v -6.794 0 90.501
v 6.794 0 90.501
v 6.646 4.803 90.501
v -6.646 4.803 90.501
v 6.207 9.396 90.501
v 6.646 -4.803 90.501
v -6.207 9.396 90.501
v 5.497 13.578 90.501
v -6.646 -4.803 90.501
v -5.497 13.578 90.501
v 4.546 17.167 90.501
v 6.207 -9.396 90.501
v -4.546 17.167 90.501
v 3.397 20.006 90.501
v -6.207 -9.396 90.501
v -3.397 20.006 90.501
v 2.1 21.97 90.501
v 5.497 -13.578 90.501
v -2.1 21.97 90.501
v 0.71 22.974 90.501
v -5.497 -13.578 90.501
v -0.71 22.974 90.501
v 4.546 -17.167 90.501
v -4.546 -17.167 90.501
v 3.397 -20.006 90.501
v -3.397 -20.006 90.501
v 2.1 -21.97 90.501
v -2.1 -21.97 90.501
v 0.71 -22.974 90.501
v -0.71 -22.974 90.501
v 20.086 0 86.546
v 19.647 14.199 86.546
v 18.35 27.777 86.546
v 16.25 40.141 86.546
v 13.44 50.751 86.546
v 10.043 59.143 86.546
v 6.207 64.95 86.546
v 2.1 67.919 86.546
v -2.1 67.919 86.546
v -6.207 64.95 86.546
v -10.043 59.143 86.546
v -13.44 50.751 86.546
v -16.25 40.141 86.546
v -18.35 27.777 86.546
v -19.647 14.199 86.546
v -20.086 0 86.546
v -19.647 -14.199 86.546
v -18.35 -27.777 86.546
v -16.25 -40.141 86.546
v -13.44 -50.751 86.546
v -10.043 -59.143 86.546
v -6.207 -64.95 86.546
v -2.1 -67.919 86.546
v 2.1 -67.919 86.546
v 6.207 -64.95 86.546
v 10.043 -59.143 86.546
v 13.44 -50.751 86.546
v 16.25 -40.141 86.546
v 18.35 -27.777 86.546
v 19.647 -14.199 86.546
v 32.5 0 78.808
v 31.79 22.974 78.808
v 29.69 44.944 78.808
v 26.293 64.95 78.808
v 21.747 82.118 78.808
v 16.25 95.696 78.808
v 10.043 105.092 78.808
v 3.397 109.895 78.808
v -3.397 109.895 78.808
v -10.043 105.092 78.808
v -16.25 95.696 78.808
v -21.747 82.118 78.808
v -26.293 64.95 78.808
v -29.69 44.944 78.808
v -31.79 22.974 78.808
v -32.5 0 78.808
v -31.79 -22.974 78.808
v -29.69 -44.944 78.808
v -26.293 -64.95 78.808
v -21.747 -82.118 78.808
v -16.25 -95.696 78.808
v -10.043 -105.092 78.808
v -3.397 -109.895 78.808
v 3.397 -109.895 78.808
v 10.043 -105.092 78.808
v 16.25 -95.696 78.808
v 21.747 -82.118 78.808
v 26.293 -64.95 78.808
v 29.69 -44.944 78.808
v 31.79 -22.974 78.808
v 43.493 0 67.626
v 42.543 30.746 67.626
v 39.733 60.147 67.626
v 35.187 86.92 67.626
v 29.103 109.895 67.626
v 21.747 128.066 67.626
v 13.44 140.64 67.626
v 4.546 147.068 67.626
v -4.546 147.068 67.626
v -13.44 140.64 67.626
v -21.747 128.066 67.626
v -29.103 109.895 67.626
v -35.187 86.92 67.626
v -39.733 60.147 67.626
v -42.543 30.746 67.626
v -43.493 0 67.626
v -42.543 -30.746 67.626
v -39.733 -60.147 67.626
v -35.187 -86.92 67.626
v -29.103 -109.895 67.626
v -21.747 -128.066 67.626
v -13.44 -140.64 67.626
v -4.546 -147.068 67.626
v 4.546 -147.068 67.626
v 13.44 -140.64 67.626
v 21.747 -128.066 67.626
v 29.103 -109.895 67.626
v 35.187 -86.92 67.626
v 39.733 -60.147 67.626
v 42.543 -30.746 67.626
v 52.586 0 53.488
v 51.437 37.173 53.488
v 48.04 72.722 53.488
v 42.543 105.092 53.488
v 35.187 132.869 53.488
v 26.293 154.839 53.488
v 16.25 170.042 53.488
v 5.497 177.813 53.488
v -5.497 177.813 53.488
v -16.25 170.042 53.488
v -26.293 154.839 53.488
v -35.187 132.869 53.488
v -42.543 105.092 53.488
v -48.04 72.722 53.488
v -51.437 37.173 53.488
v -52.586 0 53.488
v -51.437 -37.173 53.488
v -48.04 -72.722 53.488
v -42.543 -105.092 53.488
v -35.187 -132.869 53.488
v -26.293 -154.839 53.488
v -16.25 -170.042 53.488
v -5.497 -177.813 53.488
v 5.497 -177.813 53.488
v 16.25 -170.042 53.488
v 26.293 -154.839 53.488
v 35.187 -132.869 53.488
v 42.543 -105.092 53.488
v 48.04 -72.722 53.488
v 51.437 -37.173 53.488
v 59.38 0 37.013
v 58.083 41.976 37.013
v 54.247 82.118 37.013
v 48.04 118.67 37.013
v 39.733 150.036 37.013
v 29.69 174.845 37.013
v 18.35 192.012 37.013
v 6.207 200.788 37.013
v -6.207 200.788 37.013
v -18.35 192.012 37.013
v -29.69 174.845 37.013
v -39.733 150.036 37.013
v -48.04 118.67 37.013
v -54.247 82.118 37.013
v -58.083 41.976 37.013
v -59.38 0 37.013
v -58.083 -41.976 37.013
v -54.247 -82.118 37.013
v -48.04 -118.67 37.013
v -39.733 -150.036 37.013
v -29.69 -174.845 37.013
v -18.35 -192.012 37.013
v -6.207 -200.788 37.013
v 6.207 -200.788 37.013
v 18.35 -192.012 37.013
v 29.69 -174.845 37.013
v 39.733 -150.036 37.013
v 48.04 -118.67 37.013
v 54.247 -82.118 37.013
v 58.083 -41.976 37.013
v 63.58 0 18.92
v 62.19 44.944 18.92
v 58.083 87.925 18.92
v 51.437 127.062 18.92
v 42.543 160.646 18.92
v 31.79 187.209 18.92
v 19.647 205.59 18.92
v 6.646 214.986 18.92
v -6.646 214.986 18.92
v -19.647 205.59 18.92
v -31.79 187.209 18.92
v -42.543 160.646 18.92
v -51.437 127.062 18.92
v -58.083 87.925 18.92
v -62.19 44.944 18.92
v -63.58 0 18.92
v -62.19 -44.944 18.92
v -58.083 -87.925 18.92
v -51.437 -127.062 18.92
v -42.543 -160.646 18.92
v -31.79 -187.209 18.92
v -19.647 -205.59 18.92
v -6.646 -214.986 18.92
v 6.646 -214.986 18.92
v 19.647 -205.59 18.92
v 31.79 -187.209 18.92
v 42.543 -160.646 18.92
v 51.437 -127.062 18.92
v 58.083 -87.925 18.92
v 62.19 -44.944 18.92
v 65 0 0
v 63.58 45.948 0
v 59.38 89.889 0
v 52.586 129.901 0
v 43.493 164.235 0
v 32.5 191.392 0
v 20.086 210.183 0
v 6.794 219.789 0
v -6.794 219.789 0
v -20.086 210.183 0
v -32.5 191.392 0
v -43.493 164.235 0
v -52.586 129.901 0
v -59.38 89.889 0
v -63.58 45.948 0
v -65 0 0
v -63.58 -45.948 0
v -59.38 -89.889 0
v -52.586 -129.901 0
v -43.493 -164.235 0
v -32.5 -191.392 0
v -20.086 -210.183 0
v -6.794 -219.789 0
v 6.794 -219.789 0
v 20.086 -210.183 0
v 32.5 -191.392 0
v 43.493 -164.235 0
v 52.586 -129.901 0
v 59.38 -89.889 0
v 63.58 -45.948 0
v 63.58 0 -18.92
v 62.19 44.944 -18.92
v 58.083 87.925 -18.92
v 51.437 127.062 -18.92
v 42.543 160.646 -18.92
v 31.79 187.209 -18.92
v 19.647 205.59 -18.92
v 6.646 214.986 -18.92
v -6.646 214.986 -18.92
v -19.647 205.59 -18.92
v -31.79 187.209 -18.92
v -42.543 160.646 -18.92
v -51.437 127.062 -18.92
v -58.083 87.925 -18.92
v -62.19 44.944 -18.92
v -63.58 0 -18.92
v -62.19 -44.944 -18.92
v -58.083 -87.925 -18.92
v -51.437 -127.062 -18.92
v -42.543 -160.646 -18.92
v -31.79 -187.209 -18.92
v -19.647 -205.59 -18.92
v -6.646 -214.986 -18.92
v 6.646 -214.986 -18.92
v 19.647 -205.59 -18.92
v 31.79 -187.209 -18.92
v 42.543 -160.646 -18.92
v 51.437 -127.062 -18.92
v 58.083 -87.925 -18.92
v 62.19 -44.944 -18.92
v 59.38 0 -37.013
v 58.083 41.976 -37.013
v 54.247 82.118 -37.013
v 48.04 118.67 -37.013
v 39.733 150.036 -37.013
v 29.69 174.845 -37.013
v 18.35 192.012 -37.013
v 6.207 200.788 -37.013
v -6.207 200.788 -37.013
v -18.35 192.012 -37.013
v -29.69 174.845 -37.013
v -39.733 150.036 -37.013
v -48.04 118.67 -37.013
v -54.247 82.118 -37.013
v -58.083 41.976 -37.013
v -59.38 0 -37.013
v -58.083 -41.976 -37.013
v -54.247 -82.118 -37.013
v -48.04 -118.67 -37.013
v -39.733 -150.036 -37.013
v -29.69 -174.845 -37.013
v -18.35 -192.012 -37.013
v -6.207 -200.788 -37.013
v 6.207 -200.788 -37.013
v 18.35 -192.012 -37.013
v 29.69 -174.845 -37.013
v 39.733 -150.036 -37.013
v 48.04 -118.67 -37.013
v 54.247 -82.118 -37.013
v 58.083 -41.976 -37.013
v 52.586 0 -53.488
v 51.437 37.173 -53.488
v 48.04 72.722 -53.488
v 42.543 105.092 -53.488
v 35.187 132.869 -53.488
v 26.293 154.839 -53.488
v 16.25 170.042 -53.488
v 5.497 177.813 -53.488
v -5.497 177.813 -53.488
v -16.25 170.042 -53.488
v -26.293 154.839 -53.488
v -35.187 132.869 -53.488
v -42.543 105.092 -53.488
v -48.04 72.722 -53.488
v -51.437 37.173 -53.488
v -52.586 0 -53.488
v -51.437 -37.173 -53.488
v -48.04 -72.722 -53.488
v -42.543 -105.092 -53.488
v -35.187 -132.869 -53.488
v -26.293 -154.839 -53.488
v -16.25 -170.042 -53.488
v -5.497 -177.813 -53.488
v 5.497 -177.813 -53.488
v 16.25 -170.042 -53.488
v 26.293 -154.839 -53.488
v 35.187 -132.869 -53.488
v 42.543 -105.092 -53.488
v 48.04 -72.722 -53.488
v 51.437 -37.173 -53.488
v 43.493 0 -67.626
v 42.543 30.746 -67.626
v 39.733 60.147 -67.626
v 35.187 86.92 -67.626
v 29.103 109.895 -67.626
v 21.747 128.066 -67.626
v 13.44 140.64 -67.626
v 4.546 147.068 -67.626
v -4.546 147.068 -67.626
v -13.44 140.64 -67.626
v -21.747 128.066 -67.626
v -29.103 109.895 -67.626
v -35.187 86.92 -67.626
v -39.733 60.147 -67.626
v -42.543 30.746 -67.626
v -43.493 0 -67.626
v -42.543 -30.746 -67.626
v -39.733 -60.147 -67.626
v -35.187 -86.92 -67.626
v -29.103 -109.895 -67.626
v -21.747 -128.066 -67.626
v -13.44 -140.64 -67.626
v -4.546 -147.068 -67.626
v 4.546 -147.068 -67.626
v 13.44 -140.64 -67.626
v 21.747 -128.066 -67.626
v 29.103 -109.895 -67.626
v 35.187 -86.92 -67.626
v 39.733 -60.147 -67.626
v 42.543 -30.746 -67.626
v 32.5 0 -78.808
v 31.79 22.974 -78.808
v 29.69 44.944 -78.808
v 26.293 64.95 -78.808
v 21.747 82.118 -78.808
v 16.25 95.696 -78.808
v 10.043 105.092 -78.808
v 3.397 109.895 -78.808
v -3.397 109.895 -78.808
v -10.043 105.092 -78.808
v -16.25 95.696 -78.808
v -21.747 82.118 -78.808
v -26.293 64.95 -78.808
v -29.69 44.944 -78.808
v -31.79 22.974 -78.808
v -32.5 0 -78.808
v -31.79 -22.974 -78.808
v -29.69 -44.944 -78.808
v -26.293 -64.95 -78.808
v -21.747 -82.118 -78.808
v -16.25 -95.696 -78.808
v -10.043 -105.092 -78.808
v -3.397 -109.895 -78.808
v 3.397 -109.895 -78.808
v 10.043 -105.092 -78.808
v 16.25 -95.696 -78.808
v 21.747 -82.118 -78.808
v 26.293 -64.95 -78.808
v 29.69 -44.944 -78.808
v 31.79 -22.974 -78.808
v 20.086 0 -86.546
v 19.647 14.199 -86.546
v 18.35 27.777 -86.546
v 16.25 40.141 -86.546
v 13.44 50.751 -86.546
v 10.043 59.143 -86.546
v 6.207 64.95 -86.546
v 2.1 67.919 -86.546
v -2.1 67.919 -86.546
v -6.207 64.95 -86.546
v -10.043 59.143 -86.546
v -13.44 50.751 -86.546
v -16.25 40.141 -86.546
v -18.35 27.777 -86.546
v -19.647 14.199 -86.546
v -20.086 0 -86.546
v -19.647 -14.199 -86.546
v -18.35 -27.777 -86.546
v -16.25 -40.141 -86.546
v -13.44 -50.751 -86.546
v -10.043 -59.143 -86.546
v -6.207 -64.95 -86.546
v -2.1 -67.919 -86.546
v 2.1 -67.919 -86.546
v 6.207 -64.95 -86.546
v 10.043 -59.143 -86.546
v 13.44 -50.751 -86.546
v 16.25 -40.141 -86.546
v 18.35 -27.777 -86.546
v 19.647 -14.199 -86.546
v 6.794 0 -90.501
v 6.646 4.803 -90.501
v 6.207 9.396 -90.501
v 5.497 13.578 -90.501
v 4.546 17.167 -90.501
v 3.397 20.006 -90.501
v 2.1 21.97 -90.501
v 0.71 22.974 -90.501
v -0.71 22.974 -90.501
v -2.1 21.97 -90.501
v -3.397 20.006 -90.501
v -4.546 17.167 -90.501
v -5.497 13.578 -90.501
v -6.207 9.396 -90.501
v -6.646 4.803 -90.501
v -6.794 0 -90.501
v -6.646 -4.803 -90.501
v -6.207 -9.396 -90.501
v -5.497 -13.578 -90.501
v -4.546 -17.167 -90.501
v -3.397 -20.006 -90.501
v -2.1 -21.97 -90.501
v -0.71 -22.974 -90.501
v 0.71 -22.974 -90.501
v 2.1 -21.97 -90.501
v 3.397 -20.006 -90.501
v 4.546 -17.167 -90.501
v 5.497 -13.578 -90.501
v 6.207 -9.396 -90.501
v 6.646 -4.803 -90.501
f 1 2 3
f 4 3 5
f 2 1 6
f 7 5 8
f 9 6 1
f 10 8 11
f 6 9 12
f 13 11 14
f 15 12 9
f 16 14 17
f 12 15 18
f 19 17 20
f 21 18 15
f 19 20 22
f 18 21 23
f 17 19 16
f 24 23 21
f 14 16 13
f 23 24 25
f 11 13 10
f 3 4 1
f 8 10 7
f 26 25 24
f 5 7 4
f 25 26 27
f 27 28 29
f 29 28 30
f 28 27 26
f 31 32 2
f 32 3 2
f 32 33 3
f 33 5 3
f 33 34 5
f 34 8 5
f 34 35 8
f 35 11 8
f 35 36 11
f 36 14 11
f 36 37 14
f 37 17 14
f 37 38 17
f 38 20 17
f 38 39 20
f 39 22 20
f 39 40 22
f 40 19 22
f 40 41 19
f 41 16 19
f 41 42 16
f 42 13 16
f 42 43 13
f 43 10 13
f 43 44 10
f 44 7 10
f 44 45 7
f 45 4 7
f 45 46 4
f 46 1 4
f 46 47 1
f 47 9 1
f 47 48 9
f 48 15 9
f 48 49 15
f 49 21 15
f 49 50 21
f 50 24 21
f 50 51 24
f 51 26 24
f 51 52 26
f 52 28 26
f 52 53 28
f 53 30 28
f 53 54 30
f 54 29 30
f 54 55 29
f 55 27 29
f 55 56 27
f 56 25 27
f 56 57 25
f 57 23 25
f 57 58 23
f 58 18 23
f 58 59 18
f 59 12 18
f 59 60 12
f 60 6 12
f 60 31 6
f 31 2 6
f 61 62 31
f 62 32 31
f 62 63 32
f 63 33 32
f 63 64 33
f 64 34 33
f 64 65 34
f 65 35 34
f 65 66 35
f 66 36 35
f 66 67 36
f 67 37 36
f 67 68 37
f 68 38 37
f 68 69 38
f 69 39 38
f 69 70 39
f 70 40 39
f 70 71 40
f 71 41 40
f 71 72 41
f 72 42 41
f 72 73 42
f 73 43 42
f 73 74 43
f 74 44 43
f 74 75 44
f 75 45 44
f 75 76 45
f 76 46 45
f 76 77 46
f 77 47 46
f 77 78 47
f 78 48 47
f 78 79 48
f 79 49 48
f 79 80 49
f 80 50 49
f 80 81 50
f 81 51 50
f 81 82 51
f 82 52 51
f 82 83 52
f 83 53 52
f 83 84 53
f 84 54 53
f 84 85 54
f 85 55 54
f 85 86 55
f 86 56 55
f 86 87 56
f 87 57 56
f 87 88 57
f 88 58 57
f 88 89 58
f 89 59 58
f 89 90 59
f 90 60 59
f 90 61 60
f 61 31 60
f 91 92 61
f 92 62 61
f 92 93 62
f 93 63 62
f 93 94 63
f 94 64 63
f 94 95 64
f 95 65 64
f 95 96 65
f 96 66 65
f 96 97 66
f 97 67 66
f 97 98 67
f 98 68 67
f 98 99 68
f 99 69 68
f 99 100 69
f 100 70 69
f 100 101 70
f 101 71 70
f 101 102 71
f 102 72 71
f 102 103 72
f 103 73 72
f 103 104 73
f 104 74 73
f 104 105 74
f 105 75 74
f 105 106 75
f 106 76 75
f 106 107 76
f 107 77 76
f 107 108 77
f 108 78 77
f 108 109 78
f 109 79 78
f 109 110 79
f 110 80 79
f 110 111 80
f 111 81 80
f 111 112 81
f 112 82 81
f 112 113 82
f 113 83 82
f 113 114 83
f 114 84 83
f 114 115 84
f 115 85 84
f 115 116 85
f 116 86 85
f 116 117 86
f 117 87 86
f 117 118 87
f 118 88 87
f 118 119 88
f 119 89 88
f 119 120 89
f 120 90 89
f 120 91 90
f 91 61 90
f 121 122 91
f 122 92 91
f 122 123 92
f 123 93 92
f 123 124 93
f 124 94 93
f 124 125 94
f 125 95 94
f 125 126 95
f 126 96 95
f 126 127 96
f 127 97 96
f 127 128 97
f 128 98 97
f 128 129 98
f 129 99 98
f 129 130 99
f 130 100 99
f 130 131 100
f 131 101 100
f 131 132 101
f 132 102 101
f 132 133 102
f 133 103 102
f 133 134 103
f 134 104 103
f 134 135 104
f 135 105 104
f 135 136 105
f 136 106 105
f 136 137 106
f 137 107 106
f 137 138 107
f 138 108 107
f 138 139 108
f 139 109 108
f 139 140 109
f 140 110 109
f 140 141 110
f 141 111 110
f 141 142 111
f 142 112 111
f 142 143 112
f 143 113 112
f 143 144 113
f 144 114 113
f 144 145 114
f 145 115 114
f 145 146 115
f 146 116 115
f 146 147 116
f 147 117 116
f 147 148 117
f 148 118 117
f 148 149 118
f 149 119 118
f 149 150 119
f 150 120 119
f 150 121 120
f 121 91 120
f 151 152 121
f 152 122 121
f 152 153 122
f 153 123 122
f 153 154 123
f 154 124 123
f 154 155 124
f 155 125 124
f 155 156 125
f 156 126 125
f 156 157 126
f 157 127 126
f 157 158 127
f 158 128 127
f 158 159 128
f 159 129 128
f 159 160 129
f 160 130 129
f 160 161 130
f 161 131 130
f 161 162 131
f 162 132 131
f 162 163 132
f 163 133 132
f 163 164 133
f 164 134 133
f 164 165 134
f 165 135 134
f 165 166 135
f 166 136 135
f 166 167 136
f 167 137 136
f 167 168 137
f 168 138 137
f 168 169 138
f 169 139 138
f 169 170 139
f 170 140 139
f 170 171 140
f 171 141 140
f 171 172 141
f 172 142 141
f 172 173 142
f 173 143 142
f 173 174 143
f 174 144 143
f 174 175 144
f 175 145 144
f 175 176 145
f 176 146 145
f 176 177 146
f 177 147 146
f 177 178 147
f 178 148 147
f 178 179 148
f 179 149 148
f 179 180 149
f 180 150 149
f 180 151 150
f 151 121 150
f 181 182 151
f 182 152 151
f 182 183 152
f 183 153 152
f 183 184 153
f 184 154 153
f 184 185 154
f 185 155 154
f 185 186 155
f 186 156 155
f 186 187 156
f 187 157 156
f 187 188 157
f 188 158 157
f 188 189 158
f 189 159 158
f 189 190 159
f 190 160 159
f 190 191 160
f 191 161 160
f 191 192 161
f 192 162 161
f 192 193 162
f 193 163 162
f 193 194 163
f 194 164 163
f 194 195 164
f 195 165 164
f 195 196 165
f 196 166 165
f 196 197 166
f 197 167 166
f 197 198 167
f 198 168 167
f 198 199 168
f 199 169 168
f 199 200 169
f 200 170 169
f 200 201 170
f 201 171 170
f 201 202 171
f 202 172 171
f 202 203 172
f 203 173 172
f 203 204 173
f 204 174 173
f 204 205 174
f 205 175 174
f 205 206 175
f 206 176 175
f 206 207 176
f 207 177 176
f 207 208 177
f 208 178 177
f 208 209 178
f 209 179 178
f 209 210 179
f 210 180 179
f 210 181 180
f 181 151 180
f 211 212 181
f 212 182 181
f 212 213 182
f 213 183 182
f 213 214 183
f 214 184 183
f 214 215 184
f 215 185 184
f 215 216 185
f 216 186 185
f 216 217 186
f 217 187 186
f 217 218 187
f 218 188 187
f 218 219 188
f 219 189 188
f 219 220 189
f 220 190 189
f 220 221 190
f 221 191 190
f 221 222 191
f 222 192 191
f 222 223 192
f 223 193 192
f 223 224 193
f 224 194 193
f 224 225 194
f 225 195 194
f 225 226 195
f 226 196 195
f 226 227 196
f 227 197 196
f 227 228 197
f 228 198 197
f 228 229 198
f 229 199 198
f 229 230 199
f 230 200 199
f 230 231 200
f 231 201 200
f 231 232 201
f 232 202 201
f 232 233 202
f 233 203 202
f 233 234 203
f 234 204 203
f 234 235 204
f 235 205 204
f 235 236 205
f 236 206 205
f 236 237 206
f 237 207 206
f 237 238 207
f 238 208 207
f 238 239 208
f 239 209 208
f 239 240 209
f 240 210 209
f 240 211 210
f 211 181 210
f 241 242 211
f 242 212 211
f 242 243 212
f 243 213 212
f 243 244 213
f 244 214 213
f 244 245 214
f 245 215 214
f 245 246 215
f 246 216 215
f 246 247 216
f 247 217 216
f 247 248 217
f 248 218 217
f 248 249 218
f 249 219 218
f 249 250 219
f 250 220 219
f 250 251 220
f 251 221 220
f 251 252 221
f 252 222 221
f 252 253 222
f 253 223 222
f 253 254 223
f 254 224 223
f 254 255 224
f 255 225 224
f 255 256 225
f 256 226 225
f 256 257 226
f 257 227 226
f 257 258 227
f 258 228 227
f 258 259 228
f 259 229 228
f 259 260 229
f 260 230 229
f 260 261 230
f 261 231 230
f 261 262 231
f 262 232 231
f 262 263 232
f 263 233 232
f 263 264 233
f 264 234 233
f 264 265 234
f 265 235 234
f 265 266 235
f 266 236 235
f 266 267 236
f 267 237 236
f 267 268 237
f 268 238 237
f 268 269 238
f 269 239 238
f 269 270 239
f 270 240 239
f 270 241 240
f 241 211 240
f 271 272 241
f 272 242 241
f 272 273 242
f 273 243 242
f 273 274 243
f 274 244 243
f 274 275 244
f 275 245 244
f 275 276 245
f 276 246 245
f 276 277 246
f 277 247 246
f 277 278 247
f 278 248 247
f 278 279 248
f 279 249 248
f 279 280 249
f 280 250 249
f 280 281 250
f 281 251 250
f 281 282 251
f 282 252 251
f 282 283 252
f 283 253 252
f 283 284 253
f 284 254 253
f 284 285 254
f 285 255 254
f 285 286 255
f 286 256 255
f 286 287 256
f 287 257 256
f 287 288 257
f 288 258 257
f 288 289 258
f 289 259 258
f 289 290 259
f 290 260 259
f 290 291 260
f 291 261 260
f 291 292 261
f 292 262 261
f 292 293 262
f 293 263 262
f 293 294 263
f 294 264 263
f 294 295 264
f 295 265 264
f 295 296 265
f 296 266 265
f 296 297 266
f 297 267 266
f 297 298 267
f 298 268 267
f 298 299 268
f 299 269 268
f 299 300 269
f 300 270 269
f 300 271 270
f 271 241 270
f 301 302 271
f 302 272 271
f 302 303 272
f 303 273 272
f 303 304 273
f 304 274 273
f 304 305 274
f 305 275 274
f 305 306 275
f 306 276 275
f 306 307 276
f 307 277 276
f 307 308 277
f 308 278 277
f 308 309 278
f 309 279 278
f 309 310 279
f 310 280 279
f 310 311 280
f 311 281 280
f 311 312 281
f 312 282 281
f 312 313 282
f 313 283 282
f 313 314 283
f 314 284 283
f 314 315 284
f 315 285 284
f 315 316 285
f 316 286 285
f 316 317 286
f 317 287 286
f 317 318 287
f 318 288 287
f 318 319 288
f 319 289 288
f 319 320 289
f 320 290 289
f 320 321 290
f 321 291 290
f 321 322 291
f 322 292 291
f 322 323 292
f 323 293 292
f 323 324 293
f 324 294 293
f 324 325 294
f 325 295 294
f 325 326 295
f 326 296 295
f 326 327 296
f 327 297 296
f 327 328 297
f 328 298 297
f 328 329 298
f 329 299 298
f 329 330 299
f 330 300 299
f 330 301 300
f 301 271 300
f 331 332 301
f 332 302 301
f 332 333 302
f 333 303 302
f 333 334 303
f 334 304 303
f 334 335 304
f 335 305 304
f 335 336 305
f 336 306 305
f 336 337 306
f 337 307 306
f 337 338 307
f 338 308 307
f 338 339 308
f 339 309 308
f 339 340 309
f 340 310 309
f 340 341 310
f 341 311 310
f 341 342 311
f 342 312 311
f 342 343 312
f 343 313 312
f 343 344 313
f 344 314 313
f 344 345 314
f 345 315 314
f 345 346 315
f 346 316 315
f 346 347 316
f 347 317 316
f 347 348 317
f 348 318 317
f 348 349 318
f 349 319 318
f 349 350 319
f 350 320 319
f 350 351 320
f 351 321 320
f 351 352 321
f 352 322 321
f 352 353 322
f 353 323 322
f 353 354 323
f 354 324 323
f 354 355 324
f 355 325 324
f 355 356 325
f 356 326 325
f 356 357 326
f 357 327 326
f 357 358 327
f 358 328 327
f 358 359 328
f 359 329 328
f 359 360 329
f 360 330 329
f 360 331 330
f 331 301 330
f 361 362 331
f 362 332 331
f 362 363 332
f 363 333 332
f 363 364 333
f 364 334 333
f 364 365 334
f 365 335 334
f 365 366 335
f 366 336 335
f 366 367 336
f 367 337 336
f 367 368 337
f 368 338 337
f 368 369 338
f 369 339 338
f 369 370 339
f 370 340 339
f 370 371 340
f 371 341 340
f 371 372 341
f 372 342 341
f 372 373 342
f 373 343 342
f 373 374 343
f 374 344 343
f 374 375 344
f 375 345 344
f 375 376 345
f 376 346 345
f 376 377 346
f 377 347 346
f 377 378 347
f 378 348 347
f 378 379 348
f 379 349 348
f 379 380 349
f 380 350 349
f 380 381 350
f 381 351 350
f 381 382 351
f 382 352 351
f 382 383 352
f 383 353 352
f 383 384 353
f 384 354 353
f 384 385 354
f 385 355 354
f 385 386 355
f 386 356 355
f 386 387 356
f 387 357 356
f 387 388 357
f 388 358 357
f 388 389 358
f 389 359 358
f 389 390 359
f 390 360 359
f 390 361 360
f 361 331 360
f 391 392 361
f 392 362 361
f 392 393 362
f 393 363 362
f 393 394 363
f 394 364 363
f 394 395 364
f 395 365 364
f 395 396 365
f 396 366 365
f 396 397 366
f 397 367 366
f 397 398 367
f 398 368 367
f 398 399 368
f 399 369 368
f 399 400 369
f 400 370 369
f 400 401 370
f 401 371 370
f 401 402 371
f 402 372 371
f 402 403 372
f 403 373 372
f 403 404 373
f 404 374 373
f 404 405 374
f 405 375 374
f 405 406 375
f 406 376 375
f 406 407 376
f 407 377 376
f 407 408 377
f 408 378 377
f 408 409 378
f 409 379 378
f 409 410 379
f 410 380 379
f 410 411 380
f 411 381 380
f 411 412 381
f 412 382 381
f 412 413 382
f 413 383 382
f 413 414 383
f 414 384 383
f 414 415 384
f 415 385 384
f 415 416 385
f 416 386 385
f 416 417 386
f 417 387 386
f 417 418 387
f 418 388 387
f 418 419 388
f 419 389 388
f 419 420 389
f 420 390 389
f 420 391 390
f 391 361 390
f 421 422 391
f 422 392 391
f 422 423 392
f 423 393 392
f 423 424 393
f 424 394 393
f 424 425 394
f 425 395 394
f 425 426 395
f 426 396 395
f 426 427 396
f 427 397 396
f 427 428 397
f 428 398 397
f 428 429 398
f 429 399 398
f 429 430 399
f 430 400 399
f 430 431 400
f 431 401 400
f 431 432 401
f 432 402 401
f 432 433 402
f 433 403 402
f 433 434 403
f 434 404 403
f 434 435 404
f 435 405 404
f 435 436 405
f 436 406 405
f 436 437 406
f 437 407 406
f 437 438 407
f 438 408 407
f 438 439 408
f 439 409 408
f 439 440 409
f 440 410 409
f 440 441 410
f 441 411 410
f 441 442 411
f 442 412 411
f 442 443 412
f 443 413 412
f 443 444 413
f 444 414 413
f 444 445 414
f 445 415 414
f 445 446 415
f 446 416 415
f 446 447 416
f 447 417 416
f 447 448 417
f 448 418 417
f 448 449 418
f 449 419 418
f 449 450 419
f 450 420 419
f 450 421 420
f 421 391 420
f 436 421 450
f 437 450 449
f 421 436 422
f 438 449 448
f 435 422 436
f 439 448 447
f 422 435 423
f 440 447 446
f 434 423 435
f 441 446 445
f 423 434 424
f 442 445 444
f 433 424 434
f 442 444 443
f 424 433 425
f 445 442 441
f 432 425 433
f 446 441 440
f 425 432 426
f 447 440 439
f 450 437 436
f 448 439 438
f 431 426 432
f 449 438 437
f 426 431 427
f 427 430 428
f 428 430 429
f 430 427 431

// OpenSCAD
// Generated by SolidPython 1.0.1 on 2020-07-29 00:46:46


scale(v = [5, 17, 7]) {
	sphere(r = 13);
}
/***********************************************
*********      SolidPython code:      **********
************************************************
 
# import packages: SolidPython
from solid import *
from solid.utils import *
from itertools import chain, combinations, permutations


class Resize:

    def __init__(self, scad_file):
        self.scad_file = scad_file
        #self.scad_file = import_scad(scad_file)
        # cone/cylinder param:
        self.r1 = 0
        self.r2 = 0
        self.h = 0
        # rectangular prism param:
        self.w = 0
        self.l = 0
        # ellipse param:
        self.r = 0

    # import OpenScad code (file name corresponds to shape)


    # classify shape + parameters
    def assign(self, param1, param2, param3):
        if self.scad_file == 'cone.scad':
            self.r1 = param1
            self.r2 = param2
            self.h = param3
        elif self.scad_file == 'cylinder.scad':
            self.r1 = param1
            self.r2 = param2
            self.h = param3
        elif self.scad_file == 'rectangularPrism.scad':
            self.h = param1
            self.l = param2
            self.w = param3
        else:
            self.r = param1
            self.h = param2

    # resize parameters
    def iterate(self):
        x = range(3, 20, 2)
        i = 1
        if self.scad_file == 'cone.scad':
            tempList = list(permutations(x, 2))
            for temp in tempList:
                param1 = temp[0]
                param2 = temp[1]
                filepath = 'produced_scad_files/' + 'cone' + str(param1) + '_' + str(param2) + '_' + '.scad'
                scad_render_to_file(cylinder(h=param1, r1=param2, r2=0), filepath)

        elif self.scad_file == 'cylinder.scad':
            tempList = list(permutations(x, 3))
            for temp in tempList:
                param1 = temp[0]
                param2 = temp[1]
                filepath = 'produced_scad_files/' + 'cylinder' + str(param1) + '_' + str(param2) + '_' + '.scad'
                scad_render_to_file(cylinder(h=param1, r1=param2, r2=param2), filepath)

        elif self.scad_file == 'rectangularPrism.scad':
            tempList = list(permutations(x, 3))
            for temp in tempList:
                param1 = temp[0]
                param2 = temp[1]
                param3 = temp[2]
                filepath = 'produced_scad_files/' + 'rectangularPrism' + str(param1) + '_' + str(param2) + '_' + str(
                    param3) + '.scad'
                scad_render_to_file(cube(size=(param1, param2, param3)), filepath)

        elif self.scad_file == 'ellipse.scad':
            tempList = list(permutations(x, 4))
            for temp in tempList:
                param1 = temp[0]
                param2 = temp[1]
                param3 = temp[2]
                param4 = temp[3]
                filepath = 'produced_scad_files/' + 'ellipse' + str(param1) + '_' + str(param2) + '_' + str(param3) + '_' + str(param4) + '.scad'
                scad_render_to_file(scale([param1, param2, param3])(sphere(r=param4)), filepath)

    def render_to_scadfile(self):
        scad_render_to_file(scad, 'example.scad') 
 
************************************************/
